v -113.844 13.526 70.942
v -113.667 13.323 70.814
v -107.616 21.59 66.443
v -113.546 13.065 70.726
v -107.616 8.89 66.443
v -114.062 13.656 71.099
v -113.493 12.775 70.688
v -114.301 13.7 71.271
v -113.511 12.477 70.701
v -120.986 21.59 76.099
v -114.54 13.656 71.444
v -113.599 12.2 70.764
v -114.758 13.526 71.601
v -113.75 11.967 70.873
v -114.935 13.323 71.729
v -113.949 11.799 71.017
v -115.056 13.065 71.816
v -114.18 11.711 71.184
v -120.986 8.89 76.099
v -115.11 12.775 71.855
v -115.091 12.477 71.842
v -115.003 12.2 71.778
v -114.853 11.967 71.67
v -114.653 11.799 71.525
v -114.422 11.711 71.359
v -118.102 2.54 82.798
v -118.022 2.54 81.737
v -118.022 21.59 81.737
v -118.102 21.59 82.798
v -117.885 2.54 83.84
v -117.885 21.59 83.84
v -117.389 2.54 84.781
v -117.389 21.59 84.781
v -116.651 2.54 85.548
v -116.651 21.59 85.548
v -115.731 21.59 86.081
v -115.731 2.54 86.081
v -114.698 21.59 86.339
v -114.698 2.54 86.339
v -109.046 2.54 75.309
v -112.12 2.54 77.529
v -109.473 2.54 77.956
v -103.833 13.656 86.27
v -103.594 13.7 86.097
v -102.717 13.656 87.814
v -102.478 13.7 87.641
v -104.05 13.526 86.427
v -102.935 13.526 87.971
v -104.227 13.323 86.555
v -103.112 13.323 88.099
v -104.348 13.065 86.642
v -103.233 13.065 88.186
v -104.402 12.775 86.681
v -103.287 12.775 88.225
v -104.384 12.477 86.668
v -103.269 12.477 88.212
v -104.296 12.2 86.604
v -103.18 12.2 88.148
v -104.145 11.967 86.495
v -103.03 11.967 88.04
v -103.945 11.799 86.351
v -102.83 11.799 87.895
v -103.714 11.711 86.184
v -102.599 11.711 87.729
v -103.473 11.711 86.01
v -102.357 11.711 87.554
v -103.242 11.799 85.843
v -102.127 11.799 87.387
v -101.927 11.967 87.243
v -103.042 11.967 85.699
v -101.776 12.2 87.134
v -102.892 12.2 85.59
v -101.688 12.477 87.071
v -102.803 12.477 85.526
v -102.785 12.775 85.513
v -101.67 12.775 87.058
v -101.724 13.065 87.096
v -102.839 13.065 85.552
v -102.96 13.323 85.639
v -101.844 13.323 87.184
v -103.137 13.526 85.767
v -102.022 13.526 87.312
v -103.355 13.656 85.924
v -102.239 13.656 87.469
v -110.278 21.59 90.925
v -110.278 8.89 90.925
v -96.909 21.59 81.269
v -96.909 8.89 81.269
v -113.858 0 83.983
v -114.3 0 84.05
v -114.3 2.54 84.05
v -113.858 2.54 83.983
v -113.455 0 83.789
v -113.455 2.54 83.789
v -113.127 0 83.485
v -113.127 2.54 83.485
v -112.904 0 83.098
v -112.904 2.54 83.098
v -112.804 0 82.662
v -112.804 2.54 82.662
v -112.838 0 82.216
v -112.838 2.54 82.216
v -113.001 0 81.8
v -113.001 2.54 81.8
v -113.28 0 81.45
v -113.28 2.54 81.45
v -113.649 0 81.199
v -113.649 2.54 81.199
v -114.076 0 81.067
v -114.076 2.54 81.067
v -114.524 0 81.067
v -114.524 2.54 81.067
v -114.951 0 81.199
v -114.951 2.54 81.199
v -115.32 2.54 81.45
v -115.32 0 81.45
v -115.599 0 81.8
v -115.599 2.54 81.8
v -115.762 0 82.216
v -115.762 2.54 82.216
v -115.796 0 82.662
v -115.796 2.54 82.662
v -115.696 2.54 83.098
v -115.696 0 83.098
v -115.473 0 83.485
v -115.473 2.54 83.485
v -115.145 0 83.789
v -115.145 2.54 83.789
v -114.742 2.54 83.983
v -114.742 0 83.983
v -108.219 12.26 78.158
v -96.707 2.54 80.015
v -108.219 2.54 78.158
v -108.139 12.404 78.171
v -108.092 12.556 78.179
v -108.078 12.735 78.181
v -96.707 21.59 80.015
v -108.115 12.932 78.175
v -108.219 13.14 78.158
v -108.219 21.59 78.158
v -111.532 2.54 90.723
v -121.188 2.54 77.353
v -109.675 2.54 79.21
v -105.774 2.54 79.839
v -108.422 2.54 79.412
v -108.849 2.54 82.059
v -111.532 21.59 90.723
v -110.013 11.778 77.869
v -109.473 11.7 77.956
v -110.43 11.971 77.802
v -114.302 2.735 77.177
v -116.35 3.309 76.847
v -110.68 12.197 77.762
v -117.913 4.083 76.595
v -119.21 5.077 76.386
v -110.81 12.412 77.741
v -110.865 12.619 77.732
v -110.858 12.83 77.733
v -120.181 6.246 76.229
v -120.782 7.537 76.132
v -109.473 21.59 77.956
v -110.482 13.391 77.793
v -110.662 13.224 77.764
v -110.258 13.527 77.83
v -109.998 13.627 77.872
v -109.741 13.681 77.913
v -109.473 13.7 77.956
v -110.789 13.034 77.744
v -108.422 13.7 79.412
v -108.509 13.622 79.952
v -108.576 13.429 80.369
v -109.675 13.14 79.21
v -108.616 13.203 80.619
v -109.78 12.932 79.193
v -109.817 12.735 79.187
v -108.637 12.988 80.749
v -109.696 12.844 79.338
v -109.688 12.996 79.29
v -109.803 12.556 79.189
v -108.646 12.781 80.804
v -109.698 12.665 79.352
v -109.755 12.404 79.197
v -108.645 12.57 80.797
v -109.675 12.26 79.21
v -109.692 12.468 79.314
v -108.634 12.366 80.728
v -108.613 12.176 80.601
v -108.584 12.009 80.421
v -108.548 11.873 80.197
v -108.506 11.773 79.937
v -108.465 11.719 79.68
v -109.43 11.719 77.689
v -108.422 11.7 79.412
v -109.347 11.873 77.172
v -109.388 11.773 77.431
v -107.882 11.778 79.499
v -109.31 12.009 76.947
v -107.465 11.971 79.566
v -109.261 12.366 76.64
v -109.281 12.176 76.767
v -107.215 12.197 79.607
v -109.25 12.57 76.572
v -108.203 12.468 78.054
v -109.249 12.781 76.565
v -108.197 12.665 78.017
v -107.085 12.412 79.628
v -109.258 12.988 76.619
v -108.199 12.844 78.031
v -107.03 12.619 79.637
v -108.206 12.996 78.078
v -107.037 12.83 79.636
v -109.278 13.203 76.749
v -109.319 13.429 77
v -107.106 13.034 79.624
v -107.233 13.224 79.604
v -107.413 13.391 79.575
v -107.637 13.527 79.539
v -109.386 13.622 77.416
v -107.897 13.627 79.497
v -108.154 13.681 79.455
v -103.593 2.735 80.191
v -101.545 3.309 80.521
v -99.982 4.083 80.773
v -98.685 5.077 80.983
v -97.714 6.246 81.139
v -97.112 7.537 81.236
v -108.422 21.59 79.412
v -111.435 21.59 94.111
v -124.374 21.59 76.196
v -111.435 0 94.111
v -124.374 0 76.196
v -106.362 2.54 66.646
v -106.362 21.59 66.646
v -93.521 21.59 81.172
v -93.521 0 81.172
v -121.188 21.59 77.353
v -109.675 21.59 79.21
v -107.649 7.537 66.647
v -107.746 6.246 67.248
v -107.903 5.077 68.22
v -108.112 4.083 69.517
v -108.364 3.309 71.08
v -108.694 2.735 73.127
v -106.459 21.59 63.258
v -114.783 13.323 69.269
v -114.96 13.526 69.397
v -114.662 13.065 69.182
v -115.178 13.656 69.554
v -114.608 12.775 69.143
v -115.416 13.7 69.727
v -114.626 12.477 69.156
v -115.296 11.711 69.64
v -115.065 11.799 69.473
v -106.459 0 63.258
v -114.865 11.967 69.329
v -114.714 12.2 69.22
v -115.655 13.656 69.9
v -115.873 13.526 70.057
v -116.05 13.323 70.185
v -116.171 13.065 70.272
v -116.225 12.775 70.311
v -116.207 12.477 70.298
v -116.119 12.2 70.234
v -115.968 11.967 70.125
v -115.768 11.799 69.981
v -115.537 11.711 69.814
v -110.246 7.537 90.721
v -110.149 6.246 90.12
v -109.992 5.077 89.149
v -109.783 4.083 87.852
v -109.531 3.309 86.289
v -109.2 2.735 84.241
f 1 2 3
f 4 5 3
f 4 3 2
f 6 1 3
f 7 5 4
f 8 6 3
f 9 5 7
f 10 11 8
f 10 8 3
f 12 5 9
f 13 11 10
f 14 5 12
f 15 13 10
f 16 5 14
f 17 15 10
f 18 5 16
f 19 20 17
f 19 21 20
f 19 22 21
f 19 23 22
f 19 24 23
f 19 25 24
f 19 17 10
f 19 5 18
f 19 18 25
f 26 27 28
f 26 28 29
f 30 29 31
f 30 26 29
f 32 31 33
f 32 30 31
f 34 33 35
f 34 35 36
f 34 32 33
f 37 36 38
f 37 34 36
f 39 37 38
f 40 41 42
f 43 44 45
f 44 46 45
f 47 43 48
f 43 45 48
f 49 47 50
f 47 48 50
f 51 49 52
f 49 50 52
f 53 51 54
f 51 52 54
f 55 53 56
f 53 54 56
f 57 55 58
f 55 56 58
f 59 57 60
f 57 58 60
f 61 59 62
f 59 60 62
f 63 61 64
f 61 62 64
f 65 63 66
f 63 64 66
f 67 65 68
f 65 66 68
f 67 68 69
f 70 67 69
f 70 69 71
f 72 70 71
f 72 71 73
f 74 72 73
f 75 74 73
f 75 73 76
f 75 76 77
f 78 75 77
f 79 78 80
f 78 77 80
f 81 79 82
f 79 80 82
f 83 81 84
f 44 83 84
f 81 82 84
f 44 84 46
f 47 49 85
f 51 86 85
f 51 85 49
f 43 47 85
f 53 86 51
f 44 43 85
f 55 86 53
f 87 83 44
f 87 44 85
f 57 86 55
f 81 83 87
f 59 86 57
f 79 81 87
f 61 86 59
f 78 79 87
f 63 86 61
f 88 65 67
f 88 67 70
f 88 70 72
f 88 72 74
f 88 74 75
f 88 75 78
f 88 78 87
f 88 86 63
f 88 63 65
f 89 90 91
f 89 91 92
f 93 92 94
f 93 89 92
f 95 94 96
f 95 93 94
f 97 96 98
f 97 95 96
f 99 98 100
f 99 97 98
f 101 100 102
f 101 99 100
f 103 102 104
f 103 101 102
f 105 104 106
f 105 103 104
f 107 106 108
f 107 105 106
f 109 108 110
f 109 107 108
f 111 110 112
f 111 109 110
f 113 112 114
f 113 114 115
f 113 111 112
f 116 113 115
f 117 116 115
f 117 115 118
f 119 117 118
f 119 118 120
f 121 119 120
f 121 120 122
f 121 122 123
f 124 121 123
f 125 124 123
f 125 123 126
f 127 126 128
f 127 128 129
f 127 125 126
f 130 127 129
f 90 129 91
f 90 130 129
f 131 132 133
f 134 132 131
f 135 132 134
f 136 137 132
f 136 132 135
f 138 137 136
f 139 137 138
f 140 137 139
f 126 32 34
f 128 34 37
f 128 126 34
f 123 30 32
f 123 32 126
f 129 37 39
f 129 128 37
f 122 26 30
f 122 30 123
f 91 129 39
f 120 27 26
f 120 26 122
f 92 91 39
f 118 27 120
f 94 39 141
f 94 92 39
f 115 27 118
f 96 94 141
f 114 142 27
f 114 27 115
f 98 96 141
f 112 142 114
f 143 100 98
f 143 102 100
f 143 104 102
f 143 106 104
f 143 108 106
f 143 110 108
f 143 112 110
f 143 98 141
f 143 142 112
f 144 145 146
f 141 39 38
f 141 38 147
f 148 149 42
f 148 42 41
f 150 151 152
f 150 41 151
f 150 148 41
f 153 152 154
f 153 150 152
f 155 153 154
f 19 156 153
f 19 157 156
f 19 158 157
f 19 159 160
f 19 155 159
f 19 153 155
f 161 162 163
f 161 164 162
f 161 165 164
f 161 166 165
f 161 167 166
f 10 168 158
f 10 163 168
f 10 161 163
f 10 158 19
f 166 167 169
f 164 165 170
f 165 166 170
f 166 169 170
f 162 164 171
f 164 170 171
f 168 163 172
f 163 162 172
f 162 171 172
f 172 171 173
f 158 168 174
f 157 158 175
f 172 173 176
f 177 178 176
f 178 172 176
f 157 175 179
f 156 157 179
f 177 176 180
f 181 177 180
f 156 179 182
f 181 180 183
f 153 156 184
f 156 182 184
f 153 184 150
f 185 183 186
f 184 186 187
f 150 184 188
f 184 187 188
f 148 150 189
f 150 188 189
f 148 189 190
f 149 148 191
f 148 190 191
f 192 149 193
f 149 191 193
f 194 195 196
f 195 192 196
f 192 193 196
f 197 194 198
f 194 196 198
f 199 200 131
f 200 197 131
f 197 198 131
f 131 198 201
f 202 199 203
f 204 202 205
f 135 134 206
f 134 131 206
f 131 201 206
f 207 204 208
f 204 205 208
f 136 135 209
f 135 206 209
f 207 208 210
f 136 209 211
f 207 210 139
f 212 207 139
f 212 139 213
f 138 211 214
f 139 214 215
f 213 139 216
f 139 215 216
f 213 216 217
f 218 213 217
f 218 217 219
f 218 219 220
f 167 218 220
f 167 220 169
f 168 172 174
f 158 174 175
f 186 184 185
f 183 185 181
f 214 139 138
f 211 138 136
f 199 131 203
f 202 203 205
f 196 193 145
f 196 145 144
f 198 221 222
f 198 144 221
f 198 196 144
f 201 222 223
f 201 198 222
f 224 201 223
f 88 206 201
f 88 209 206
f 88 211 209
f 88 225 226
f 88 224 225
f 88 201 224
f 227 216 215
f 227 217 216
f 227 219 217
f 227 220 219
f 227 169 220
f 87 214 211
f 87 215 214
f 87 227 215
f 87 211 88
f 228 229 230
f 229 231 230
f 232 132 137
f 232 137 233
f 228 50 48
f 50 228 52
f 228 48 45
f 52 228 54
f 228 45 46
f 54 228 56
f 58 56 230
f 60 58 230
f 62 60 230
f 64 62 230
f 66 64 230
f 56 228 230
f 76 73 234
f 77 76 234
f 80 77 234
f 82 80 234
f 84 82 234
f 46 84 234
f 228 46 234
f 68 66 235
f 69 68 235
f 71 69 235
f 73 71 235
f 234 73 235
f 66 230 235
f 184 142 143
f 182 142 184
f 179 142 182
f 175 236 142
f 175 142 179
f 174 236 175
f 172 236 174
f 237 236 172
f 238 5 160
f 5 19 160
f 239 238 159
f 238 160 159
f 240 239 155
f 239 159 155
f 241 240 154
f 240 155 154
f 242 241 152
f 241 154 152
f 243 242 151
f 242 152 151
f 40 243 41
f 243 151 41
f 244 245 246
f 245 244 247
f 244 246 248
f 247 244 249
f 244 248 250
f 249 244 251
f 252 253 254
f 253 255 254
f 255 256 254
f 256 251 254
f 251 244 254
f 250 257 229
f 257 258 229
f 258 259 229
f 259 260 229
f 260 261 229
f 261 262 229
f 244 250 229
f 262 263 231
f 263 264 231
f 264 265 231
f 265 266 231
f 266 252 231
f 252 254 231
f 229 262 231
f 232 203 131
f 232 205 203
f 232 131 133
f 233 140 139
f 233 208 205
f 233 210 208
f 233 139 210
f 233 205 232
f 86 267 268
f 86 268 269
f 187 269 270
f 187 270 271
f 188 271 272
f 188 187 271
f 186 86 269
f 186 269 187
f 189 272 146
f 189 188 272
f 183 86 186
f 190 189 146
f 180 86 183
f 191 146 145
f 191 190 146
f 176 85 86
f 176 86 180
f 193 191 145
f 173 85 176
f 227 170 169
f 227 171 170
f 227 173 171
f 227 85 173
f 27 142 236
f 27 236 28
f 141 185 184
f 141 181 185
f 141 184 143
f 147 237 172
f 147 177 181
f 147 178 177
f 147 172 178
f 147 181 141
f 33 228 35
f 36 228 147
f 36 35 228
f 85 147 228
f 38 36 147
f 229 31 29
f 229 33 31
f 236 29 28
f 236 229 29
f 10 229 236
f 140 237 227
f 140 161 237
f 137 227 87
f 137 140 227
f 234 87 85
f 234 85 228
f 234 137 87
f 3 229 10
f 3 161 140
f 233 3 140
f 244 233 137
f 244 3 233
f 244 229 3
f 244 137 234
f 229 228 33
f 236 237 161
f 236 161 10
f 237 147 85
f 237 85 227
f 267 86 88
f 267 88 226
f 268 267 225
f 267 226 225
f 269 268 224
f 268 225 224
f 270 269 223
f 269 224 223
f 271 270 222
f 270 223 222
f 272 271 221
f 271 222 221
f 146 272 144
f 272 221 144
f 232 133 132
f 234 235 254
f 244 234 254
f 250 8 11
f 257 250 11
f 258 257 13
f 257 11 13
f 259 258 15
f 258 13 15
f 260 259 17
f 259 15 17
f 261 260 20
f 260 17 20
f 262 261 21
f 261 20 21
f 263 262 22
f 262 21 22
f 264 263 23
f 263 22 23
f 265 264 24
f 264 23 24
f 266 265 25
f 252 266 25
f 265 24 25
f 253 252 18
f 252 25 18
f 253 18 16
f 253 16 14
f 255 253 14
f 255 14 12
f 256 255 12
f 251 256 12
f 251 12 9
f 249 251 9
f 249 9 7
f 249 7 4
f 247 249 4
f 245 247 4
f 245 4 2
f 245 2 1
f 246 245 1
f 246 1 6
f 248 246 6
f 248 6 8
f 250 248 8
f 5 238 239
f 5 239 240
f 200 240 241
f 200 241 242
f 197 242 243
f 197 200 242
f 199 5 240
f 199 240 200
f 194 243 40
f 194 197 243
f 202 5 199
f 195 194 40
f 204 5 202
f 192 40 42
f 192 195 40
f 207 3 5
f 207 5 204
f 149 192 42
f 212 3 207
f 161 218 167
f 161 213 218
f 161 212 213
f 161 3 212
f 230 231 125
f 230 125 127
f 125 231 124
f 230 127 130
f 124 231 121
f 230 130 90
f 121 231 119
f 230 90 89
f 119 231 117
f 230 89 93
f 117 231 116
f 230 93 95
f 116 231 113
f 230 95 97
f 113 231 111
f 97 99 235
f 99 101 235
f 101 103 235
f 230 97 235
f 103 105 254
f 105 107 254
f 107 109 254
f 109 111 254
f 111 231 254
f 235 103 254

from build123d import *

# Parameters (mm, degrees)
SKETCH1_R           = 1.5
BOSS_EXTRUDE2_DEPTH = 2.54
BOSS_EXTRUDE3_DEPTH = 19.05
BOSS_EXTRUDE6_DEPTH = 19.05
SKETCH4_R           = 1
CUT_EXTRUDE1_DEPTH  = 158.597711186
FILLET1_R           = 6.35


with BuildPart() as part:
    # Sketch1 → Boss-Extrude2 (new body)
    with BuildSketch(Plane(origin=(0, 0, 0), x_dir=(1, 0, 0), z_dir=(0, 1, 0))):
        Polygon((-93.521103592, -81.172331094), (-106.459273851, -63.257941504), (-124.37366344, -76.196111763), (-111.435493182, -94.110501353), align=None)
        with Locations(Location((-114.3, -82.55, 0), (0, 0, 270))):
            Circle(SKETCH1_R, mode=Mode.SUBTRACT)
    extrude(amount=BOSS_EXTRUDE2_DEPTH)

    # Sketch2 → Boss-Extrude3 (add)
    with BuildSketch(Plane(origin=(0, 2.54, 0), x_dir=(1, 0, 0), z_dir=(0, 1, 0))):
        Polygon((-106.459273851, -63.257941504), (-124.37366344, -76.196111763), (-111.435493182, -94.110501353), (-93.521103592, -81.172331094), align=None)
        with BuildLine():
            Line((-106.888258276, -65.91764494), (-121.713960005, -76.625096188))
            Line((-121.713960005, -76.625096188), (-118.022197338, -81.736767574))
            ThreePointArc((-118.022197338, -81.736767574), (-117.38868786, -84.78071901), (-114.698271424, -86.339126532))
            Line((-114.698271424, -86.339126532), (-111.006508757, -91.450797917))
            Line((-111.006508757, -91.450797917), (-96.180807028, -80.743346669))
            Line((-96.180807028, -80.743346669), (-106.888258276, -65.91764494))
        make_face(mode=Mode.SUBTRACT)
    extrude(amount=BOSS_EXTRUDE3_DEPTH)

    # Sketch3 → Boss-Extrude6 (add)
    with BuildSketch(Plane(origin=(0, 21.59, 0), x_dir=(1, 0, 0), z_dir=(0, 1, 0))):
        Polygon((-121.713960005, -76.625096188), (-121.188174492, -77.353106899), (-109.675394227, -79.210006941), (-111.53229427, -90.722787207), (-111.006508757, -91.450797917), (-110.278498046, -90.925012404), (-108.421598003, -79.412232139), (-96.908817738, -81.269132182), (-96.180807028, -80.743346669), (-96.706592541, -80.015335958), (-108.219372806, -78.158435915), (-106.362472763, -66.64565565), (-106.888258276, -65.91764494), (-107.616268987, -66.443430453), (-109.473169029, -77.956210718), (-120.985949295, -76.099310675), align=None)
    extrude(amount=-BOSS_EXTRUDE6_DEPTH)

    # Sketch4 → Cut-Extrude1 (cut, through all)
    with BuildSketch(Plane(origin=(6.469085129, 0, 8.957194795), x_dir=(0.8106792283998809, 0, -0.5854905538443587), z_dir=(0.5854905538443586, 0, 0.8106792283998808))):
        with Locations(Location((-134.390249188, 12.7, 0), (0, 0, 90))):
            Circle(SKETCH4_R)
    extrude(amount=-CUT_EXTRUDE1_DEPTH, mode=Mode.SUBTRACT)

    # Fillet1
    fillet1_edges = [part.edges().sort_by_distance(p)[0] for p in [
        (-103.593657892, 2.54, 86.097072293),
        (-114.301109141, 2.54, 71.271370564),
    ]]
    fillet(fillet1_edges, radius=FILLET1_R)


solid = part.part
